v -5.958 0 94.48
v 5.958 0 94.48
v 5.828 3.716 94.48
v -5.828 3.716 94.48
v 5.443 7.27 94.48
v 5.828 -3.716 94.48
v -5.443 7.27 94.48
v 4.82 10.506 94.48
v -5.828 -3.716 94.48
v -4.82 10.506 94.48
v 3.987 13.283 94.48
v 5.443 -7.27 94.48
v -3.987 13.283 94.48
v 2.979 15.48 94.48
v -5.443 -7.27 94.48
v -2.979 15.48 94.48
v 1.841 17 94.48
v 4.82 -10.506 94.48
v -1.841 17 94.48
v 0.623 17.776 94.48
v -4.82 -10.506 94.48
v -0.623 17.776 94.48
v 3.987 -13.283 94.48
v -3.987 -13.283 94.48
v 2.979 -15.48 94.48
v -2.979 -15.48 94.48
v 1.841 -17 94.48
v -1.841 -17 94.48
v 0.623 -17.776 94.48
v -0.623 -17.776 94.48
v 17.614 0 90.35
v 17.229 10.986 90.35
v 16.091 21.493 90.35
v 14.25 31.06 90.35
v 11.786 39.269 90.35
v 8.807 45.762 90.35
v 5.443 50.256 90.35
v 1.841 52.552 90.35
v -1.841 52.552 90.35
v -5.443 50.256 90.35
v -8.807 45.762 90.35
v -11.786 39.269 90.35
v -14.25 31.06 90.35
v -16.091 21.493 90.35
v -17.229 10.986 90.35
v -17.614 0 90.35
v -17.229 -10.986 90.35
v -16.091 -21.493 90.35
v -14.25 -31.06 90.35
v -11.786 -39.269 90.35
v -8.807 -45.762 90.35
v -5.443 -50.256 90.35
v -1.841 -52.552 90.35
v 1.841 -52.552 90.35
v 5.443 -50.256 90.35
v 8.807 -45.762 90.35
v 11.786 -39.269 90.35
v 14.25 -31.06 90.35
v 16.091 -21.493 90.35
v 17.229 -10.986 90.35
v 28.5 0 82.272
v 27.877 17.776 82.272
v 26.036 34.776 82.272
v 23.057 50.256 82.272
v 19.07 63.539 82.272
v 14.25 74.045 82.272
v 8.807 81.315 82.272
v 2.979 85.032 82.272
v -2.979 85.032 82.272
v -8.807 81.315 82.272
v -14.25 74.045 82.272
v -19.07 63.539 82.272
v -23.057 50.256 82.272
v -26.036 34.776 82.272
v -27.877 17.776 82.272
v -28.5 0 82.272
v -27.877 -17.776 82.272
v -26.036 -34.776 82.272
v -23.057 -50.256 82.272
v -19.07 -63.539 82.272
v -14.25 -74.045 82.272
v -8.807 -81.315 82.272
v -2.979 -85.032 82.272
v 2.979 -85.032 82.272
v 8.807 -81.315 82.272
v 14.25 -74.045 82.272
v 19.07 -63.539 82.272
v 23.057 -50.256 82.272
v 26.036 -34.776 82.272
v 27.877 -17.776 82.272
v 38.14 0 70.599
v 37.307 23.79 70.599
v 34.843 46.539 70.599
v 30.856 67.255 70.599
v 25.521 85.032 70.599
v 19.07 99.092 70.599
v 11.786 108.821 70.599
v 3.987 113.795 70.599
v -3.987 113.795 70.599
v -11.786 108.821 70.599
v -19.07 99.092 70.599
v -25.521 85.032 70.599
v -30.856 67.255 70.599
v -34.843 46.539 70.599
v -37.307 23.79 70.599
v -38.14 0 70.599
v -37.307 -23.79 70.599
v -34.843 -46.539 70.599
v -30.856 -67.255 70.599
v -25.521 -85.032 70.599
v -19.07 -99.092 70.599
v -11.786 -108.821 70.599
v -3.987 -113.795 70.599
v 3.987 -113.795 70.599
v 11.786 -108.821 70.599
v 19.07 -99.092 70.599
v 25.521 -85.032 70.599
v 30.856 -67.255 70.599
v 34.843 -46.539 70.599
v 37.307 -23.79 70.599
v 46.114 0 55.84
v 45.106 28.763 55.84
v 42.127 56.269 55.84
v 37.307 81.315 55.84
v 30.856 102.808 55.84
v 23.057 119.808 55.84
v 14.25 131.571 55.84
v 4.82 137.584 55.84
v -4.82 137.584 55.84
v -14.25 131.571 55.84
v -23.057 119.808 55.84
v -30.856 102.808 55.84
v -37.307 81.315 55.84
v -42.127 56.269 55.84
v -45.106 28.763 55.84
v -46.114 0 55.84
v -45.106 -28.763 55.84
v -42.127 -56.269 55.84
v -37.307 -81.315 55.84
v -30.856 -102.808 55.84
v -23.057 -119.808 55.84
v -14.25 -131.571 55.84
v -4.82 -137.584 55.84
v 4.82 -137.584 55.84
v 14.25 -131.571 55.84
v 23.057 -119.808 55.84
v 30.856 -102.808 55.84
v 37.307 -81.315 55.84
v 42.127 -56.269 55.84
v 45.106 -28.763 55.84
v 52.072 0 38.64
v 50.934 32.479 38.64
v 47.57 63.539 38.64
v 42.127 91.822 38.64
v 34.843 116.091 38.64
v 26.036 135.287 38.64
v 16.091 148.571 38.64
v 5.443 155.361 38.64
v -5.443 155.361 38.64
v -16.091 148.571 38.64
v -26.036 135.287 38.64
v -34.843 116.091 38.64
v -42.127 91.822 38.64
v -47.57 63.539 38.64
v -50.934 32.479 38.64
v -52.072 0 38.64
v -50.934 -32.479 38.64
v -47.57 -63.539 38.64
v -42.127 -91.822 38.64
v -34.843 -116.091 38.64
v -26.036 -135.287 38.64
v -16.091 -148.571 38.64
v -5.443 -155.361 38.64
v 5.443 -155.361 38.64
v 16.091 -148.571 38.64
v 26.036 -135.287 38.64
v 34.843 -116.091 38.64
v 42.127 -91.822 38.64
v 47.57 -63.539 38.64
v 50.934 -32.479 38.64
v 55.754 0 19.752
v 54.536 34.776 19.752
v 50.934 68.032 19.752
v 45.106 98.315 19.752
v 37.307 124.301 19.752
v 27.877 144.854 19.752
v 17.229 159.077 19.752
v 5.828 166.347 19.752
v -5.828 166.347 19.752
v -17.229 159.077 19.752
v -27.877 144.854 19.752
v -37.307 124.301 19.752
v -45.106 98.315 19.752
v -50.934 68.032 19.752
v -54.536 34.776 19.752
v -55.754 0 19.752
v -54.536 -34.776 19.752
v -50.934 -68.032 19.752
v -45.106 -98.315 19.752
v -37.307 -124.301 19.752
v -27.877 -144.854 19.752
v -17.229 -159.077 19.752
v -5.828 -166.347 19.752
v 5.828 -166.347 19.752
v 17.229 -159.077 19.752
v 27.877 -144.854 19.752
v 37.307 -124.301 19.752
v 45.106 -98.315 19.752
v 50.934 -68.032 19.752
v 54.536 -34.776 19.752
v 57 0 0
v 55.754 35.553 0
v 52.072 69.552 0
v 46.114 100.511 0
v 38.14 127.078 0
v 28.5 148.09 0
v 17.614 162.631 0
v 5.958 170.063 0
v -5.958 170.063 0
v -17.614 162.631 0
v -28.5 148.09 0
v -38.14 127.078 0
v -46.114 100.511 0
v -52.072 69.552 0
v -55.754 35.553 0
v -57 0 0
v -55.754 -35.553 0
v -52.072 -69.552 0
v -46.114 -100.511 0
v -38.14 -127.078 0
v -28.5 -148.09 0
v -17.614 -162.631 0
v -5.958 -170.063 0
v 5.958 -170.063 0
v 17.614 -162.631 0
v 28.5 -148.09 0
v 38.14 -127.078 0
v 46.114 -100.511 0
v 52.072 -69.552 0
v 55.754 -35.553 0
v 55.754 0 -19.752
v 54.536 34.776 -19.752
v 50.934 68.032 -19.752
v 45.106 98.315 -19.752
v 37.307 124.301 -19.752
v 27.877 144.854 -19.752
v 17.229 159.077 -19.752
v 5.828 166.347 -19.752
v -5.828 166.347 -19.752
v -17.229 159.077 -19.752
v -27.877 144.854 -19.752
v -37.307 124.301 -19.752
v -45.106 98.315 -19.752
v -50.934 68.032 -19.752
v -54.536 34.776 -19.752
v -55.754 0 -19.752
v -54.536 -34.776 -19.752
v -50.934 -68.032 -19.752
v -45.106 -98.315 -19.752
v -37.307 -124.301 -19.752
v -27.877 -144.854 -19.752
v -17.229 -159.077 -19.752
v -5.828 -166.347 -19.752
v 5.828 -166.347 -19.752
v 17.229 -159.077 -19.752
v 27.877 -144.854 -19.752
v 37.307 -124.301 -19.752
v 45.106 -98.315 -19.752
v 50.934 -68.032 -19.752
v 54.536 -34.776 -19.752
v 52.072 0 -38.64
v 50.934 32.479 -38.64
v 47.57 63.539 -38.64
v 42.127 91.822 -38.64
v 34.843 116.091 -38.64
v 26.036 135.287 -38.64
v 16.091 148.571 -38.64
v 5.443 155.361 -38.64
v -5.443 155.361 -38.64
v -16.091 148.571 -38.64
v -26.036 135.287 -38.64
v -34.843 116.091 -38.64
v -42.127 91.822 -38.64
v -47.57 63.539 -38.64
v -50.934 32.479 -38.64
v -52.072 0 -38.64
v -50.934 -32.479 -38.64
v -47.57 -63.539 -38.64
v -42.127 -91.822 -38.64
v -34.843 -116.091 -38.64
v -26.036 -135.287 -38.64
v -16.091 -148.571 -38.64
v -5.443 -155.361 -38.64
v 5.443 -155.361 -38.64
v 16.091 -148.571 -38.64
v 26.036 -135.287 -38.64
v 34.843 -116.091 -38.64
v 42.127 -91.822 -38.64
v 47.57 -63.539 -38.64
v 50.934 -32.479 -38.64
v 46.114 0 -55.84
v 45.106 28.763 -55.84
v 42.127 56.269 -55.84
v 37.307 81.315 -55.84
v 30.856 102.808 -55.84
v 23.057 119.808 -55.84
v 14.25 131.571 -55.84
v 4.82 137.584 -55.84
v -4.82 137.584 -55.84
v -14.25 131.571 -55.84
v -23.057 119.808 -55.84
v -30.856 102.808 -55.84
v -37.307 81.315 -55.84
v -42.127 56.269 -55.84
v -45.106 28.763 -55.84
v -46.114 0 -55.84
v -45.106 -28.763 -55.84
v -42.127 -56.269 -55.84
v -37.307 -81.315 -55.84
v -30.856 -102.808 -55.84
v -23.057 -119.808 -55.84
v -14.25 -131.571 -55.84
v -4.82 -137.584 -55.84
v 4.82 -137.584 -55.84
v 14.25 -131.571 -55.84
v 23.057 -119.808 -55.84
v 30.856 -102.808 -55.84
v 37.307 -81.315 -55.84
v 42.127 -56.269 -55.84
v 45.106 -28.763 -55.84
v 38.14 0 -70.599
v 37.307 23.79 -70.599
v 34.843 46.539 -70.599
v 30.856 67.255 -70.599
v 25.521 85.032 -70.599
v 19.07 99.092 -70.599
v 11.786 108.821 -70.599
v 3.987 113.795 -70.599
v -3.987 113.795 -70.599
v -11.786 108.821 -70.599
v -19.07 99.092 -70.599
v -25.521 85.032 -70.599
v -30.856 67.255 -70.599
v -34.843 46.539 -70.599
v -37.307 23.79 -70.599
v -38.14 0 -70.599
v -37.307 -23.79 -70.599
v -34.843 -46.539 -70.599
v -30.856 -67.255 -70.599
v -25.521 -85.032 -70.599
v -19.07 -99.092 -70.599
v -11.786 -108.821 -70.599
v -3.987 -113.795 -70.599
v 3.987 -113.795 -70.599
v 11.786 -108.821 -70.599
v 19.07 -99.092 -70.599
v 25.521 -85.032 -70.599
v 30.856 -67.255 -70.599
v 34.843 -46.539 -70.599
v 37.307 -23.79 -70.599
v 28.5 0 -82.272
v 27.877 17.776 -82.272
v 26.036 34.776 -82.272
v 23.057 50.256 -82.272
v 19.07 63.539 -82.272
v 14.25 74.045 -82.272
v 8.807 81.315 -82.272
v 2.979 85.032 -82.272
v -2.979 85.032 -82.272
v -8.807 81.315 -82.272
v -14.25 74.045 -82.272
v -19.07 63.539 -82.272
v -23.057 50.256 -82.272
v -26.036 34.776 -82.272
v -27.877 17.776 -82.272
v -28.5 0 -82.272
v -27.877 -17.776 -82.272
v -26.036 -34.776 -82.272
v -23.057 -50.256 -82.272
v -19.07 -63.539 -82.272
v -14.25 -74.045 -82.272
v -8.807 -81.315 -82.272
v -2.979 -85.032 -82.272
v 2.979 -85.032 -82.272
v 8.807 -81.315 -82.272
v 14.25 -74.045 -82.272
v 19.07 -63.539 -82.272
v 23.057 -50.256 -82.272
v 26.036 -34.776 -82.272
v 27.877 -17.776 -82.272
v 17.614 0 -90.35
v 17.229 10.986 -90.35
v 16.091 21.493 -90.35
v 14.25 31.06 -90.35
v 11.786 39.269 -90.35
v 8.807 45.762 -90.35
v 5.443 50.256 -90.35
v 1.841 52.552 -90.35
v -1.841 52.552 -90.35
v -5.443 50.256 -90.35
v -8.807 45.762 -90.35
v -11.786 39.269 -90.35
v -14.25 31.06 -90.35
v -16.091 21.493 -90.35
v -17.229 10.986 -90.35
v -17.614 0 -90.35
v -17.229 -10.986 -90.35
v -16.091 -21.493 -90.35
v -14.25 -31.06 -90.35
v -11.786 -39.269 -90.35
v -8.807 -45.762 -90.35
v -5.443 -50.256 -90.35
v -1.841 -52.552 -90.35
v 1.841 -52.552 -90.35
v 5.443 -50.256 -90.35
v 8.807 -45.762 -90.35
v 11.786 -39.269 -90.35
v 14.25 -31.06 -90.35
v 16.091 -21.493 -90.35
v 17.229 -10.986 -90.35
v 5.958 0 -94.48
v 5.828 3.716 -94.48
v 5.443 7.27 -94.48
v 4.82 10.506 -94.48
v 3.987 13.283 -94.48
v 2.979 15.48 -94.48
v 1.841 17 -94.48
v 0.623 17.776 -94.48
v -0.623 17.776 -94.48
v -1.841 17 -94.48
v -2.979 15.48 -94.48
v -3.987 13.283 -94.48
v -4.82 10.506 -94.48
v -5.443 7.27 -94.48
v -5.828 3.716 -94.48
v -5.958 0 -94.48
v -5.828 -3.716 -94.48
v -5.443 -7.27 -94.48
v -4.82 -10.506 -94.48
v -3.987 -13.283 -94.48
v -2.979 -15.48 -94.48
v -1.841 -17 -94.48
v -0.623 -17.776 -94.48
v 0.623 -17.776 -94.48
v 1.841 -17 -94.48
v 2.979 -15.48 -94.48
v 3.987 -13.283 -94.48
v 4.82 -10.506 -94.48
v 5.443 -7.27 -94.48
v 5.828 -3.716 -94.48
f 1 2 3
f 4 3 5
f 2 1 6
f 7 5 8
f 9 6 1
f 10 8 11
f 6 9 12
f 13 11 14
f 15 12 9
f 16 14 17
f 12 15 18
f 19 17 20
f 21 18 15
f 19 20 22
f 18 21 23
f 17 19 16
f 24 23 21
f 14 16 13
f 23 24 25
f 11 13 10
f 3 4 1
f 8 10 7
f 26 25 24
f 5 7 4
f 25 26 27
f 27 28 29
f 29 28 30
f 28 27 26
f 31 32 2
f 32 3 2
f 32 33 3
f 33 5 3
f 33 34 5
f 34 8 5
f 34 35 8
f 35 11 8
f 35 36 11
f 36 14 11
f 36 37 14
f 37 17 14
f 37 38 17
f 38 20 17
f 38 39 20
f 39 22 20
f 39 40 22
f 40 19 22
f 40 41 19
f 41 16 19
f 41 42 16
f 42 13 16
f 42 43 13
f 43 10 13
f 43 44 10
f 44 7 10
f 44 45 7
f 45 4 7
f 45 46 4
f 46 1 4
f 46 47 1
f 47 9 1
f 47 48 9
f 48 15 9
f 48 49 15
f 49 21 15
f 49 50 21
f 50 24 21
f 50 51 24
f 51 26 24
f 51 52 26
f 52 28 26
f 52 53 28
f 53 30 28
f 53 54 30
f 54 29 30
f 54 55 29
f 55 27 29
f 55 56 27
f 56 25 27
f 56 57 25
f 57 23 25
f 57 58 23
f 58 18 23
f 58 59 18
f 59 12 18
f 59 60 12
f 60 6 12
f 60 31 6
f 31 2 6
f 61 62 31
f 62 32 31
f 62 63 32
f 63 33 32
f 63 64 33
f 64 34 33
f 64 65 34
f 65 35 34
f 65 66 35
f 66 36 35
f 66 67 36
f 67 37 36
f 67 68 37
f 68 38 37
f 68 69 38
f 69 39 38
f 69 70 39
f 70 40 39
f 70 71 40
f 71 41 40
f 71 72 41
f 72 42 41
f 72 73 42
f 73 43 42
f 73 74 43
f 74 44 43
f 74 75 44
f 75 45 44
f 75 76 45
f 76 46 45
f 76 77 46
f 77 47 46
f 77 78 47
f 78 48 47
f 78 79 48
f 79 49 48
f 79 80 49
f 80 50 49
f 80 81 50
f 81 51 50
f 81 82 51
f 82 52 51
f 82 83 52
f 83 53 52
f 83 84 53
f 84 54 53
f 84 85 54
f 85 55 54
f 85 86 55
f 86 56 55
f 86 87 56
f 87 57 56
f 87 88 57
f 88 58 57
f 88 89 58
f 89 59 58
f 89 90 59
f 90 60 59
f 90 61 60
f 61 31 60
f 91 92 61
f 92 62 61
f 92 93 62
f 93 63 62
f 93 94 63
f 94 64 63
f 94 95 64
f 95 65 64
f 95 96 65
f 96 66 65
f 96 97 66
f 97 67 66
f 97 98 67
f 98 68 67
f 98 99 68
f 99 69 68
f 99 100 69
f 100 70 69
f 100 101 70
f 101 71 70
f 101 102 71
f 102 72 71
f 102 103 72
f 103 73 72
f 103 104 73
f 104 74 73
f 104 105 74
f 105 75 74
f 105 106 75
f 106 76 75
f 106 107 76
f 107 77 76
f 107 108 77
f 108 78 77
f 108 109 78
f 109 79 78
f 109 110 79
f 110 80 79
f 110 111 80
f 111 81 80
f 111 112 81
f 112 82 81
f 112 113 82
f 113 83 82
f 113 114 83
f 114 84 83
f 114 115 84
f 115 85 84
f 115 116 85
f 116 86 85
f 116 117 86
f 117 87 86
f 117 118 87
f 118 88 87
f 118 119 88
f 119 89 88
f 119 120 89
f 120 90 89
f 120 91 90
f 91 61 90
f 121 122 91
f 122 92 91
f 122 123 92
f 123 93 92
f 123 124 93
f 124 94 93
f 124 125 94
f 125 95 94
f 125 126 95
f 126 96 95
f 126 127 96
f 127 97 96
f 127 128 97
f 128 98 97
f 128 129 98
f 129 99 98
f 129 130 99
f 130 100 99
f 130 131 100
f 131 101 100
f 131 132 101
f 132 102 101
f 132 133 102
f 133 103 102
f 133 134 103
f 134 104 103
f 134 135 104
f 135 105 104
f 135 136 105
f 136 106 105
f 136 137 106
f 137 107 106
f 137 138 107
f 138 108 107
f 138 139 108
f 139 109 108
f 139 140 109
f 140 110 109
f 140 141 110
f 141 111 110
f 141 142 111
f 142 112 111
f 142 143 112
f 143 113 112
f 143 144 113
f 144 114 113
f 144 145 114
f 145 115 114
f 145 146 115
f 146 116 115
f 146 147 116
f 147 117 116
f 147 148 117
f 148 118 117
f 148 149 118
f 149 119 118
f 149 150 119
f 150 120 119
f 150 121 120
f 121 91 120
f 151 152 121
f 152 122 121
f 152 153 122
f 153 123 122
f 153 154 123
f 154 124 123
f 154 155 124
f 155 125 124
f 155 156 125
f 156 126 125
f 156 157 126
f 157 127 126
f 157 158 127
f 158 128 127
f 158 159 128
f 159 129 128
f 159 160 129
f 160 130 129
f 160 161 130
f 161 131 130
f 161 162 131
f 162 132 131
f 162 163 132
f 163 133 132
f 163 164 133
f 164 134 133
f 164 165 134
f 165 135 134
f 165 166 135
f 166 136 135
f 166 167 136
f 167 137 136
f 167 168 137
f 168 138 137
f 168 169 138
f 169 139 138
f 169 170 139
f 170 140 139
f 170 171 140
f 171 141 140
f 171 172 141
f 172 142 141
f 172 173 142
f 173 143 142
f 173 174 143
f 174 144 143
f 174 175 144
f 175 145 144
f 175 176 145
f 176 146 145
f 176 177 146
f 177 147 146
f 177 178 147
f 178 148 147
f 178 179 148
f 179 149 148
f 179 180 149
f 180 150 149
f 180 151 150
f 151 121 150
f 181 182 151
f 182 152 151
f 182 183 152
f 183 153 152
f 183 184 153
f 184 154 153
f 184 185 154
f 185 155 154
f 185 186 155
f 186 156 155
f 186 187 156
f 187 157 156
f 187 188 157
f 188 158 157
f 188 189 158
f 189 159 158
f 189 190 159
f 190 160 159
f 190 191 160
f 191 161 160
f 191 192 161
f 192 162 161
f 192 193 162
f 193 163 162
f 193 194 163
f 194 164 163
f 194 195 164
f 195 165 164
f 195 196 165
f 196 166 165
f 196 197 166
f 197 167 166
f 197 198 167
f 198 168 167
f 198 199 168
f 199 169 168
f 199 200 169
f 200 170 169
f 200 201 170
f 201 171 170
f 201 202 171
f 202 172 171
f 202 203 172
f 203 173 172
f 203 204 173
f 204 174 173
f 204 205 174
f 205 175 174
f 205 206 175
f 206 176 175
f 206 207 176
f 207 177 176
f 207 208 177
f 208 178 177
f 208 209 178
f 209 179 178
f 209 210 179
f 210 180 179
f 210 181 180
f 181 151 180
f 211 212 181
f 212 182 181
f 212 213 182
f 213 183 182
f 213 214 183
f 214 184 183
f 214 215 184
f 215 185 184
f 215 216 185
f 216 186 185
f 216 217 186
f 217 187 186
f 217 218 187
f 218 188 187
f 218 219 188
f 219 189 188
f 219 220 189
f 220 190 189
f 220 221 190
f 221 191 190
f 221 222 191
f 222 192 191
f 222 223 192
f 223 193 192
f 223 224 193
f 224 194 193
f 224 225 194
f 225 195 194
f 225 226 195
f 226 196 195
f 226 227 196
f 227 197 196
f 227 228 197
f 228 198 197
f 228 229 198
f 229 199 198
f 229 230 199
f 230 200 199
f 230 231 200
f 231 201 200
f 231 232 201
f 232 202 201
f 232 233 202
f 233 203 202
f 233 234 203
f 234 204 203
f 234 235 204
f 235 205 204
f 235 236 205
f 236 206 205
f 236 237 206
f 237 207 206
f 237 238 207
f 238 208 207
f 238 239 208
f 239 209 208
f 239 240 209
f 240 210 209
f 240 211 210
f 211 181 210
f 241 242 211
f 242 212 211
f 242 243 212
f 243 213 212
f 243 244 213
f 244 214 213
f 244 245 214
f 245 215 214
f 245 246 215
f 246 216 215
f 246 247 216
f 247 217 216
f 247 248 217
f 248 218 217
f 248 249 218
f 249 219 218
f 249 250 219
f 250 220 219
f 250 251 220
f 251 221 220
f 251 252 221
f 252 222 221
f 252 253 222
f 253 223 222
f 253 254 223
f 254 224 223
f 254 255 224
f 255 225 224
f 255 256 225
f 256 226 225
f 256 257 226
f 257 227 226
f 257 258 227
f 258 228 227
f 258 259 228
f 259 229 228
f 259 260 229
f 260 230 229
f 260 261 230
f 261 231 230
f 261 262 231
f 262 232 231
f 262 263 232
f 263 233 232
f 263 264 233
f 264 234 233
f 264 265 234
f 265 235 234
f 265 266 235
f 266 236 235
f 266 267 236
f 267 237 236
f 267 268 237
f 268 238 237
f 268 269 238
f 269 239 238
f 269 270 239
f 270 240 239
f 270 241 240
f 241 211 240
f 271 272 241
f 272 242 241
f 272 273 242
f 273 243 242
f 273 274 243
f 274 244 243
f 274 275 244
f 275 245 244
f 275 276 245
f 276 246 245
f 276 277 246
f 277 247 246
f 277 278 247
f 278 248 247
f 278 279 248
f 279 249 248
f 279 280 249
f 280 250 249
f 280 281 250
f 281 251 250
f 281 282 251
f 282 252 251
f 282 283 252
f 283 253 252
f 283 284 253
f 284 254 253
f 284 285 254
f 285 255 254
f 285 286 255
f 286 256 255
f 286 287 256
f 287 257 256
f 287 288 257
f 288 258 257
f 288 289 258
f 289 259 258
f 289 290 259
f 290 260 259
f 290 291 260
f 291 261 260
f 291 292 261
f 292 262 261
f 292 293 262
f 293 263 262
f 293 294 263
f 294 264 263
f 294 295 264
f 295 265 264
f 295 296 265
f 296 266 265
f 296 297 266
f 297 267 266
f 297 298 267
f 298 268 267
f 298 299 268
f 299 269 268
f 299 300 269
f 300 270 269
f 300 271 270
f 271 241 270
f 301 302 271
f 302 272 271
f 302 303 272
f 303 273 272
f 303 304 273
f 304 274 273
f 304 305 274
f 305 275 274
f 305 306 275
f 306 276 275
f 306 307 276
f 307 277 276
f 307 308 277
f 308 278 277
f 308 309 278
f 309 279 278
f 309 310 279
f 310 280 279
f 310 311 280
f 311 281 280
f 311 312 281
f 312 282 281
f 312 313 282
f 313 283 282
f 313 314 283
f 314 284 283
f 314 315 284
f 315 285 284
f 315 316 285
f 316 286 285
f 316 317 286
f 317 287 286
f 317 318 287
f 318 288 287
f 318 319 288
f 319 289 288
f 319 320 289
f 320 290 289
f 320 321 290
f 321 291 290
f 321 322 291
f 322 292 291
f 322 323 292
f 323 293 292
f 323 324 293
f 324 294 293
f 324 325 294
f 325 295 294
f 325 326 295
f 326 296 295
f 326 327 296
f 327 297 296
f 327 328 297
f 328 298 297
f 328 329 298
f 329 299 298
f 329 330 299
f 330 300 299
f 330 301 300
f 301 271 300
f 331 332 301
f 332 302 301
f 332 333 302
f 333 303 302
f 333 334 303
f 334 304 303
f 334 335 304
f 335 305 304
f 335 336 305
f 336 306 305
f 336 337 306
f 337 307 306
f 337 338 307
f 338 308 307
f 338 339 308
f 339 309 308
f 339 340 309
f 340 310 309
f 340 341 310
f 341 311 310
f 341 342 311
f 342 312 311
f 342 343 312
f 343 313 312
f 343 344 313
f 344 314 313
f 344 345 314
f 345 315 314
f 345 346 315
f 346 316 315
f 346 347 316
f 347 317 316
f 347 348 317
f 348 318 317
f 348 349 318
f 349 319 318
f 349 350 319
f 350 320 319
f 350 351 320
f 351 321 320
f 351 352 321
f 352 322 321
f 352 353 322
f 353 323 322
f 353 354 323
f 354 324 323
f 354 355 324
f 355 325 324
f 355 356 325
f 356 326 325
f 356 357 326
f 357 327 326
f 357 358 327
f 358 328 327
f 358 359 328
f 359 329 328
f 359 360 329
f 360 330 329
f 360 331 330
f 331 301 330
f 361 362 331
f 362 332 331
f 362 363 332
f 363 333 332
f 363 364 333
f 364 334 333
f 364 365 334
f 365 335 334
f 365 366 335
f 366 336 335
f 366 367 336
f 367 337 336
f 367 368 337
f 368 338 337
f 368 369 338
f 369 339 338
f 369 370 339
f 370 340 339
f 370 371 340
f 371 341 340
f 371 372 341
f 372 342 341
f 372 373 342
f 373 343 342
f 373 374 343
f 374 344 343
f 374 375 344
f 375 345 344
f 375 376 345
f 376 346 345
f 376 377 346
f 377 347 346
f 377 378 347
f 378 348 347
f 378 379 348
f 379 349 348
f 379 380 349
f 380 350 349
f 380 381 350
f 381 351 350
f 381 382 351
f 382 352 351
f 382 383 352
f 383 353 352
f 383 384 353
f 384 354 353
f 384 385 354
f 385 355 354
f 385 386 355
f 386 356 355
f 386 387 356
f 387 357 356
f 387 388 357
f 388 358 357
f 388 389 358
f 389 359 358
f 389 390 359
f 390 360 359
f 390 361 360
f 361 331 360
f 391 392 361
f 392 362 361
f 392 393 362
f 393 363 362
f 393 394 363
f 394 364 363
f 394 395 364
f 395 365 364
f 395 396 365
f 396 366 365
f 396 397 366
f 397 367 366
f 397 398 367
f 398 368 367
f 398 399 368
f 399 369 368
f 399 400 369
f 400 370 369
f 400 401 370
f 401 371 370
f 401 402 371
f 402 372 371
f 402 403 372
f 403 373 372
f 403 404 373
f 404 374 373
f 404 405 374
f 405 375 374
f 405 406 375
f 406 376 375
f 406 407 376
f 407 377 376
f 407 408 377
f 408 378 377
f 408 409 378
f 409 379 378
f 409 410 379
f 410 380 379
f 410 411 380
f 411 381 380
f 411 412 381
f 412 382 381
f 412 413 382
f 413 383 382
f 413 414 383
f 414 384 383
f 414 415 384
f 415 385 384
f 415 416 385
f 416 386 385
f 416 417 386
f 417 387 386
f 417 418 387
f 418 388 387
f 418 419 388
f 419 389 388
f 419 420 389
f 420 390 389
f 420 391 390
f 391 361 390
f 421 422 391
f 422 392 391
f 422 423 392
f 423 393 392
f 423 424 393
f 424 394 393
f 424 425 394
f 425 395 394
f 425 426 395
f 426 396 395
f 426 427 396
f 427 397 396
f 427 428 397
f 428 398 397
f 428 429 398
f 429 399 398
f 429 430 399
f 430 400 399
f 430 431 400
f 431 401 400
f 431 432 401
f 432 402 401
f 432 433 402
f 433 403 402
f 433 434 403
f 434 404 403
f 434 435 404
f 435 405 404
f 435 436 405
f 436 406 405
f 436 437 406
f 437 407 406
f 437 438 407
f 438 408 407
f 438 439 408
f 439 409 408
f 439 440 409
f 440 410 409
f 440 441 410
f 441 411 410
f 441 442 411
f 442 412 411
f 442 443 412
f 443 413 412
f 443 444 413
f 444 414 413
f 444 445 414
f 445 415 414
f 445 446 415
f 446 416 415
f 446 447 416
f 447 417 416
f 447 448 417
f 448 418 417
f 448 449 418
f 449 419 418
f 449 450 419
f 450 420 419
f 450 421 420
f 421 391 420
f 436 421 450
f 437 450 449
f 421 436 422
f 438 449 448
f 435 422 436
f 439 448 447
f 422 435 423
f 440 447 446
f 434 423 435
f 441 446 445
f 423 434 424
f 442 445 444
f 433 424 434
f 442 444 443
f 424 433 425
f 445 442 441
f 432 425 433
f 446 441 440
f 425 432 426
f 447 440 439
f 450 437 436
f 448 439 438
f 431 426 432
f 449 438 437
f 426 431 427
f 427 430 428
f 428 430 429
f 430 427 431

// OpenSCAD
// Generated by SolidPython 1.0.1 on 2020-07-29 00:46:45


scale(v = [3, 9, 5]) {
	sphere(r = 19);
}
/***********************************************
*********      SolidPython code:      **********
************************************************
 
# import packages: SolidPython
from solid import *
from solid.utils import *
from itertools import chain, combinations, permutations


class Resize:

    def __init__(self, scad_file):
        self.scad_file = scad_file
        #self.scad_file = import_scad(scad_file)
        # cone/cylinder param:
        self.r1 = 0
        self.r2 = 0
        self.h = 0
        # rectangular prism param:
        self.w = 0
        self.l = 0
        # ellipse param:
        self.r = 0

    # import OpenScad code (file name corresponds to shape)


    # classify shape + parameters
    def assign(self, param1, param2, param3):
        if self.scad_file == 'cone.scad':
            self.r1 = param1
            self.r2 = param2
            self.h = param3
        elif self.scad_file == 'cylinder.scad':
            self.r1 = param1
            self.r2 = param2
            self.h = param3
        elif self.scad_file == 'rectangularPrism.scad':
            self.h = param1
            self.l = param2
            self.w = param3
        else:
            self.r = param1
            self.h = param2

    # resize parameters
    def iterate(self):
        x = range(3, 20, 2)
        i = 1
        if self.scad_file == 'cone.scad':
            tempList = list(permutations(x, 2))
            for temp in tempList:
                param1 = temp[0]
                param2 = temp[1]
                filepath = 'produced_scad_files/' + 'cone' + str(param1) + '_' + str(param2) + '_' + '.scad'
                scad_render_to_file(cylinder(h=param1, r1=param2, r2=0), filepath)

        elif self.scad_file == 'cylinder.scad':
            tempList = list(permutations(x, 3))
            for temp in tempList:
                param1 = temp[0]
                param2 = temp[1]
                filepath = 'produced_scad_files/' + 'cylinder' + str(param1) + '_' + str(param2) + '_' + '.scad'
                scad_render_to_file(cylinder(h=param1, r1=param2, r2=param2), filepath)

        elif self.scad_file == 'rectangularPrism.scad':
            tempList = list(permutations(x, 3))
            for temp in tempList:
                param1 = temp[0]
                param2 = temp[1]
                param3 = temp[2]
                filepath = 'produced_scad_files/' + 'rectangularPrism' + str(param1) + '_' + str(param2) + '_' + str(
                    param3) + '.scad'
                scad_render_to_file(cube(size=(param1, param2, param3)), filepath)

        elif self.scad_file == 'ellipse.scad':
            tempList = list(permutations(x, 4))
            for temp in tempList:
                param1 = temp[0]
                param2 = temp[1]
                param3 = temp[2]
                param4 = temp[3]
                filepath = 'produced_scad_files/' + 'ellipse' + str(param1) + '_' + str(param2) + '_' + str(param3) + '_' + str(param4) + '.scad'
                scad_render_to_file(scale([param1, param2, param3])(sphere(r=param4)), filepath)

    def render_to_scadfile(self):
        scad_render_to_file(scad, 'example.scad') 
 
************************************************/
